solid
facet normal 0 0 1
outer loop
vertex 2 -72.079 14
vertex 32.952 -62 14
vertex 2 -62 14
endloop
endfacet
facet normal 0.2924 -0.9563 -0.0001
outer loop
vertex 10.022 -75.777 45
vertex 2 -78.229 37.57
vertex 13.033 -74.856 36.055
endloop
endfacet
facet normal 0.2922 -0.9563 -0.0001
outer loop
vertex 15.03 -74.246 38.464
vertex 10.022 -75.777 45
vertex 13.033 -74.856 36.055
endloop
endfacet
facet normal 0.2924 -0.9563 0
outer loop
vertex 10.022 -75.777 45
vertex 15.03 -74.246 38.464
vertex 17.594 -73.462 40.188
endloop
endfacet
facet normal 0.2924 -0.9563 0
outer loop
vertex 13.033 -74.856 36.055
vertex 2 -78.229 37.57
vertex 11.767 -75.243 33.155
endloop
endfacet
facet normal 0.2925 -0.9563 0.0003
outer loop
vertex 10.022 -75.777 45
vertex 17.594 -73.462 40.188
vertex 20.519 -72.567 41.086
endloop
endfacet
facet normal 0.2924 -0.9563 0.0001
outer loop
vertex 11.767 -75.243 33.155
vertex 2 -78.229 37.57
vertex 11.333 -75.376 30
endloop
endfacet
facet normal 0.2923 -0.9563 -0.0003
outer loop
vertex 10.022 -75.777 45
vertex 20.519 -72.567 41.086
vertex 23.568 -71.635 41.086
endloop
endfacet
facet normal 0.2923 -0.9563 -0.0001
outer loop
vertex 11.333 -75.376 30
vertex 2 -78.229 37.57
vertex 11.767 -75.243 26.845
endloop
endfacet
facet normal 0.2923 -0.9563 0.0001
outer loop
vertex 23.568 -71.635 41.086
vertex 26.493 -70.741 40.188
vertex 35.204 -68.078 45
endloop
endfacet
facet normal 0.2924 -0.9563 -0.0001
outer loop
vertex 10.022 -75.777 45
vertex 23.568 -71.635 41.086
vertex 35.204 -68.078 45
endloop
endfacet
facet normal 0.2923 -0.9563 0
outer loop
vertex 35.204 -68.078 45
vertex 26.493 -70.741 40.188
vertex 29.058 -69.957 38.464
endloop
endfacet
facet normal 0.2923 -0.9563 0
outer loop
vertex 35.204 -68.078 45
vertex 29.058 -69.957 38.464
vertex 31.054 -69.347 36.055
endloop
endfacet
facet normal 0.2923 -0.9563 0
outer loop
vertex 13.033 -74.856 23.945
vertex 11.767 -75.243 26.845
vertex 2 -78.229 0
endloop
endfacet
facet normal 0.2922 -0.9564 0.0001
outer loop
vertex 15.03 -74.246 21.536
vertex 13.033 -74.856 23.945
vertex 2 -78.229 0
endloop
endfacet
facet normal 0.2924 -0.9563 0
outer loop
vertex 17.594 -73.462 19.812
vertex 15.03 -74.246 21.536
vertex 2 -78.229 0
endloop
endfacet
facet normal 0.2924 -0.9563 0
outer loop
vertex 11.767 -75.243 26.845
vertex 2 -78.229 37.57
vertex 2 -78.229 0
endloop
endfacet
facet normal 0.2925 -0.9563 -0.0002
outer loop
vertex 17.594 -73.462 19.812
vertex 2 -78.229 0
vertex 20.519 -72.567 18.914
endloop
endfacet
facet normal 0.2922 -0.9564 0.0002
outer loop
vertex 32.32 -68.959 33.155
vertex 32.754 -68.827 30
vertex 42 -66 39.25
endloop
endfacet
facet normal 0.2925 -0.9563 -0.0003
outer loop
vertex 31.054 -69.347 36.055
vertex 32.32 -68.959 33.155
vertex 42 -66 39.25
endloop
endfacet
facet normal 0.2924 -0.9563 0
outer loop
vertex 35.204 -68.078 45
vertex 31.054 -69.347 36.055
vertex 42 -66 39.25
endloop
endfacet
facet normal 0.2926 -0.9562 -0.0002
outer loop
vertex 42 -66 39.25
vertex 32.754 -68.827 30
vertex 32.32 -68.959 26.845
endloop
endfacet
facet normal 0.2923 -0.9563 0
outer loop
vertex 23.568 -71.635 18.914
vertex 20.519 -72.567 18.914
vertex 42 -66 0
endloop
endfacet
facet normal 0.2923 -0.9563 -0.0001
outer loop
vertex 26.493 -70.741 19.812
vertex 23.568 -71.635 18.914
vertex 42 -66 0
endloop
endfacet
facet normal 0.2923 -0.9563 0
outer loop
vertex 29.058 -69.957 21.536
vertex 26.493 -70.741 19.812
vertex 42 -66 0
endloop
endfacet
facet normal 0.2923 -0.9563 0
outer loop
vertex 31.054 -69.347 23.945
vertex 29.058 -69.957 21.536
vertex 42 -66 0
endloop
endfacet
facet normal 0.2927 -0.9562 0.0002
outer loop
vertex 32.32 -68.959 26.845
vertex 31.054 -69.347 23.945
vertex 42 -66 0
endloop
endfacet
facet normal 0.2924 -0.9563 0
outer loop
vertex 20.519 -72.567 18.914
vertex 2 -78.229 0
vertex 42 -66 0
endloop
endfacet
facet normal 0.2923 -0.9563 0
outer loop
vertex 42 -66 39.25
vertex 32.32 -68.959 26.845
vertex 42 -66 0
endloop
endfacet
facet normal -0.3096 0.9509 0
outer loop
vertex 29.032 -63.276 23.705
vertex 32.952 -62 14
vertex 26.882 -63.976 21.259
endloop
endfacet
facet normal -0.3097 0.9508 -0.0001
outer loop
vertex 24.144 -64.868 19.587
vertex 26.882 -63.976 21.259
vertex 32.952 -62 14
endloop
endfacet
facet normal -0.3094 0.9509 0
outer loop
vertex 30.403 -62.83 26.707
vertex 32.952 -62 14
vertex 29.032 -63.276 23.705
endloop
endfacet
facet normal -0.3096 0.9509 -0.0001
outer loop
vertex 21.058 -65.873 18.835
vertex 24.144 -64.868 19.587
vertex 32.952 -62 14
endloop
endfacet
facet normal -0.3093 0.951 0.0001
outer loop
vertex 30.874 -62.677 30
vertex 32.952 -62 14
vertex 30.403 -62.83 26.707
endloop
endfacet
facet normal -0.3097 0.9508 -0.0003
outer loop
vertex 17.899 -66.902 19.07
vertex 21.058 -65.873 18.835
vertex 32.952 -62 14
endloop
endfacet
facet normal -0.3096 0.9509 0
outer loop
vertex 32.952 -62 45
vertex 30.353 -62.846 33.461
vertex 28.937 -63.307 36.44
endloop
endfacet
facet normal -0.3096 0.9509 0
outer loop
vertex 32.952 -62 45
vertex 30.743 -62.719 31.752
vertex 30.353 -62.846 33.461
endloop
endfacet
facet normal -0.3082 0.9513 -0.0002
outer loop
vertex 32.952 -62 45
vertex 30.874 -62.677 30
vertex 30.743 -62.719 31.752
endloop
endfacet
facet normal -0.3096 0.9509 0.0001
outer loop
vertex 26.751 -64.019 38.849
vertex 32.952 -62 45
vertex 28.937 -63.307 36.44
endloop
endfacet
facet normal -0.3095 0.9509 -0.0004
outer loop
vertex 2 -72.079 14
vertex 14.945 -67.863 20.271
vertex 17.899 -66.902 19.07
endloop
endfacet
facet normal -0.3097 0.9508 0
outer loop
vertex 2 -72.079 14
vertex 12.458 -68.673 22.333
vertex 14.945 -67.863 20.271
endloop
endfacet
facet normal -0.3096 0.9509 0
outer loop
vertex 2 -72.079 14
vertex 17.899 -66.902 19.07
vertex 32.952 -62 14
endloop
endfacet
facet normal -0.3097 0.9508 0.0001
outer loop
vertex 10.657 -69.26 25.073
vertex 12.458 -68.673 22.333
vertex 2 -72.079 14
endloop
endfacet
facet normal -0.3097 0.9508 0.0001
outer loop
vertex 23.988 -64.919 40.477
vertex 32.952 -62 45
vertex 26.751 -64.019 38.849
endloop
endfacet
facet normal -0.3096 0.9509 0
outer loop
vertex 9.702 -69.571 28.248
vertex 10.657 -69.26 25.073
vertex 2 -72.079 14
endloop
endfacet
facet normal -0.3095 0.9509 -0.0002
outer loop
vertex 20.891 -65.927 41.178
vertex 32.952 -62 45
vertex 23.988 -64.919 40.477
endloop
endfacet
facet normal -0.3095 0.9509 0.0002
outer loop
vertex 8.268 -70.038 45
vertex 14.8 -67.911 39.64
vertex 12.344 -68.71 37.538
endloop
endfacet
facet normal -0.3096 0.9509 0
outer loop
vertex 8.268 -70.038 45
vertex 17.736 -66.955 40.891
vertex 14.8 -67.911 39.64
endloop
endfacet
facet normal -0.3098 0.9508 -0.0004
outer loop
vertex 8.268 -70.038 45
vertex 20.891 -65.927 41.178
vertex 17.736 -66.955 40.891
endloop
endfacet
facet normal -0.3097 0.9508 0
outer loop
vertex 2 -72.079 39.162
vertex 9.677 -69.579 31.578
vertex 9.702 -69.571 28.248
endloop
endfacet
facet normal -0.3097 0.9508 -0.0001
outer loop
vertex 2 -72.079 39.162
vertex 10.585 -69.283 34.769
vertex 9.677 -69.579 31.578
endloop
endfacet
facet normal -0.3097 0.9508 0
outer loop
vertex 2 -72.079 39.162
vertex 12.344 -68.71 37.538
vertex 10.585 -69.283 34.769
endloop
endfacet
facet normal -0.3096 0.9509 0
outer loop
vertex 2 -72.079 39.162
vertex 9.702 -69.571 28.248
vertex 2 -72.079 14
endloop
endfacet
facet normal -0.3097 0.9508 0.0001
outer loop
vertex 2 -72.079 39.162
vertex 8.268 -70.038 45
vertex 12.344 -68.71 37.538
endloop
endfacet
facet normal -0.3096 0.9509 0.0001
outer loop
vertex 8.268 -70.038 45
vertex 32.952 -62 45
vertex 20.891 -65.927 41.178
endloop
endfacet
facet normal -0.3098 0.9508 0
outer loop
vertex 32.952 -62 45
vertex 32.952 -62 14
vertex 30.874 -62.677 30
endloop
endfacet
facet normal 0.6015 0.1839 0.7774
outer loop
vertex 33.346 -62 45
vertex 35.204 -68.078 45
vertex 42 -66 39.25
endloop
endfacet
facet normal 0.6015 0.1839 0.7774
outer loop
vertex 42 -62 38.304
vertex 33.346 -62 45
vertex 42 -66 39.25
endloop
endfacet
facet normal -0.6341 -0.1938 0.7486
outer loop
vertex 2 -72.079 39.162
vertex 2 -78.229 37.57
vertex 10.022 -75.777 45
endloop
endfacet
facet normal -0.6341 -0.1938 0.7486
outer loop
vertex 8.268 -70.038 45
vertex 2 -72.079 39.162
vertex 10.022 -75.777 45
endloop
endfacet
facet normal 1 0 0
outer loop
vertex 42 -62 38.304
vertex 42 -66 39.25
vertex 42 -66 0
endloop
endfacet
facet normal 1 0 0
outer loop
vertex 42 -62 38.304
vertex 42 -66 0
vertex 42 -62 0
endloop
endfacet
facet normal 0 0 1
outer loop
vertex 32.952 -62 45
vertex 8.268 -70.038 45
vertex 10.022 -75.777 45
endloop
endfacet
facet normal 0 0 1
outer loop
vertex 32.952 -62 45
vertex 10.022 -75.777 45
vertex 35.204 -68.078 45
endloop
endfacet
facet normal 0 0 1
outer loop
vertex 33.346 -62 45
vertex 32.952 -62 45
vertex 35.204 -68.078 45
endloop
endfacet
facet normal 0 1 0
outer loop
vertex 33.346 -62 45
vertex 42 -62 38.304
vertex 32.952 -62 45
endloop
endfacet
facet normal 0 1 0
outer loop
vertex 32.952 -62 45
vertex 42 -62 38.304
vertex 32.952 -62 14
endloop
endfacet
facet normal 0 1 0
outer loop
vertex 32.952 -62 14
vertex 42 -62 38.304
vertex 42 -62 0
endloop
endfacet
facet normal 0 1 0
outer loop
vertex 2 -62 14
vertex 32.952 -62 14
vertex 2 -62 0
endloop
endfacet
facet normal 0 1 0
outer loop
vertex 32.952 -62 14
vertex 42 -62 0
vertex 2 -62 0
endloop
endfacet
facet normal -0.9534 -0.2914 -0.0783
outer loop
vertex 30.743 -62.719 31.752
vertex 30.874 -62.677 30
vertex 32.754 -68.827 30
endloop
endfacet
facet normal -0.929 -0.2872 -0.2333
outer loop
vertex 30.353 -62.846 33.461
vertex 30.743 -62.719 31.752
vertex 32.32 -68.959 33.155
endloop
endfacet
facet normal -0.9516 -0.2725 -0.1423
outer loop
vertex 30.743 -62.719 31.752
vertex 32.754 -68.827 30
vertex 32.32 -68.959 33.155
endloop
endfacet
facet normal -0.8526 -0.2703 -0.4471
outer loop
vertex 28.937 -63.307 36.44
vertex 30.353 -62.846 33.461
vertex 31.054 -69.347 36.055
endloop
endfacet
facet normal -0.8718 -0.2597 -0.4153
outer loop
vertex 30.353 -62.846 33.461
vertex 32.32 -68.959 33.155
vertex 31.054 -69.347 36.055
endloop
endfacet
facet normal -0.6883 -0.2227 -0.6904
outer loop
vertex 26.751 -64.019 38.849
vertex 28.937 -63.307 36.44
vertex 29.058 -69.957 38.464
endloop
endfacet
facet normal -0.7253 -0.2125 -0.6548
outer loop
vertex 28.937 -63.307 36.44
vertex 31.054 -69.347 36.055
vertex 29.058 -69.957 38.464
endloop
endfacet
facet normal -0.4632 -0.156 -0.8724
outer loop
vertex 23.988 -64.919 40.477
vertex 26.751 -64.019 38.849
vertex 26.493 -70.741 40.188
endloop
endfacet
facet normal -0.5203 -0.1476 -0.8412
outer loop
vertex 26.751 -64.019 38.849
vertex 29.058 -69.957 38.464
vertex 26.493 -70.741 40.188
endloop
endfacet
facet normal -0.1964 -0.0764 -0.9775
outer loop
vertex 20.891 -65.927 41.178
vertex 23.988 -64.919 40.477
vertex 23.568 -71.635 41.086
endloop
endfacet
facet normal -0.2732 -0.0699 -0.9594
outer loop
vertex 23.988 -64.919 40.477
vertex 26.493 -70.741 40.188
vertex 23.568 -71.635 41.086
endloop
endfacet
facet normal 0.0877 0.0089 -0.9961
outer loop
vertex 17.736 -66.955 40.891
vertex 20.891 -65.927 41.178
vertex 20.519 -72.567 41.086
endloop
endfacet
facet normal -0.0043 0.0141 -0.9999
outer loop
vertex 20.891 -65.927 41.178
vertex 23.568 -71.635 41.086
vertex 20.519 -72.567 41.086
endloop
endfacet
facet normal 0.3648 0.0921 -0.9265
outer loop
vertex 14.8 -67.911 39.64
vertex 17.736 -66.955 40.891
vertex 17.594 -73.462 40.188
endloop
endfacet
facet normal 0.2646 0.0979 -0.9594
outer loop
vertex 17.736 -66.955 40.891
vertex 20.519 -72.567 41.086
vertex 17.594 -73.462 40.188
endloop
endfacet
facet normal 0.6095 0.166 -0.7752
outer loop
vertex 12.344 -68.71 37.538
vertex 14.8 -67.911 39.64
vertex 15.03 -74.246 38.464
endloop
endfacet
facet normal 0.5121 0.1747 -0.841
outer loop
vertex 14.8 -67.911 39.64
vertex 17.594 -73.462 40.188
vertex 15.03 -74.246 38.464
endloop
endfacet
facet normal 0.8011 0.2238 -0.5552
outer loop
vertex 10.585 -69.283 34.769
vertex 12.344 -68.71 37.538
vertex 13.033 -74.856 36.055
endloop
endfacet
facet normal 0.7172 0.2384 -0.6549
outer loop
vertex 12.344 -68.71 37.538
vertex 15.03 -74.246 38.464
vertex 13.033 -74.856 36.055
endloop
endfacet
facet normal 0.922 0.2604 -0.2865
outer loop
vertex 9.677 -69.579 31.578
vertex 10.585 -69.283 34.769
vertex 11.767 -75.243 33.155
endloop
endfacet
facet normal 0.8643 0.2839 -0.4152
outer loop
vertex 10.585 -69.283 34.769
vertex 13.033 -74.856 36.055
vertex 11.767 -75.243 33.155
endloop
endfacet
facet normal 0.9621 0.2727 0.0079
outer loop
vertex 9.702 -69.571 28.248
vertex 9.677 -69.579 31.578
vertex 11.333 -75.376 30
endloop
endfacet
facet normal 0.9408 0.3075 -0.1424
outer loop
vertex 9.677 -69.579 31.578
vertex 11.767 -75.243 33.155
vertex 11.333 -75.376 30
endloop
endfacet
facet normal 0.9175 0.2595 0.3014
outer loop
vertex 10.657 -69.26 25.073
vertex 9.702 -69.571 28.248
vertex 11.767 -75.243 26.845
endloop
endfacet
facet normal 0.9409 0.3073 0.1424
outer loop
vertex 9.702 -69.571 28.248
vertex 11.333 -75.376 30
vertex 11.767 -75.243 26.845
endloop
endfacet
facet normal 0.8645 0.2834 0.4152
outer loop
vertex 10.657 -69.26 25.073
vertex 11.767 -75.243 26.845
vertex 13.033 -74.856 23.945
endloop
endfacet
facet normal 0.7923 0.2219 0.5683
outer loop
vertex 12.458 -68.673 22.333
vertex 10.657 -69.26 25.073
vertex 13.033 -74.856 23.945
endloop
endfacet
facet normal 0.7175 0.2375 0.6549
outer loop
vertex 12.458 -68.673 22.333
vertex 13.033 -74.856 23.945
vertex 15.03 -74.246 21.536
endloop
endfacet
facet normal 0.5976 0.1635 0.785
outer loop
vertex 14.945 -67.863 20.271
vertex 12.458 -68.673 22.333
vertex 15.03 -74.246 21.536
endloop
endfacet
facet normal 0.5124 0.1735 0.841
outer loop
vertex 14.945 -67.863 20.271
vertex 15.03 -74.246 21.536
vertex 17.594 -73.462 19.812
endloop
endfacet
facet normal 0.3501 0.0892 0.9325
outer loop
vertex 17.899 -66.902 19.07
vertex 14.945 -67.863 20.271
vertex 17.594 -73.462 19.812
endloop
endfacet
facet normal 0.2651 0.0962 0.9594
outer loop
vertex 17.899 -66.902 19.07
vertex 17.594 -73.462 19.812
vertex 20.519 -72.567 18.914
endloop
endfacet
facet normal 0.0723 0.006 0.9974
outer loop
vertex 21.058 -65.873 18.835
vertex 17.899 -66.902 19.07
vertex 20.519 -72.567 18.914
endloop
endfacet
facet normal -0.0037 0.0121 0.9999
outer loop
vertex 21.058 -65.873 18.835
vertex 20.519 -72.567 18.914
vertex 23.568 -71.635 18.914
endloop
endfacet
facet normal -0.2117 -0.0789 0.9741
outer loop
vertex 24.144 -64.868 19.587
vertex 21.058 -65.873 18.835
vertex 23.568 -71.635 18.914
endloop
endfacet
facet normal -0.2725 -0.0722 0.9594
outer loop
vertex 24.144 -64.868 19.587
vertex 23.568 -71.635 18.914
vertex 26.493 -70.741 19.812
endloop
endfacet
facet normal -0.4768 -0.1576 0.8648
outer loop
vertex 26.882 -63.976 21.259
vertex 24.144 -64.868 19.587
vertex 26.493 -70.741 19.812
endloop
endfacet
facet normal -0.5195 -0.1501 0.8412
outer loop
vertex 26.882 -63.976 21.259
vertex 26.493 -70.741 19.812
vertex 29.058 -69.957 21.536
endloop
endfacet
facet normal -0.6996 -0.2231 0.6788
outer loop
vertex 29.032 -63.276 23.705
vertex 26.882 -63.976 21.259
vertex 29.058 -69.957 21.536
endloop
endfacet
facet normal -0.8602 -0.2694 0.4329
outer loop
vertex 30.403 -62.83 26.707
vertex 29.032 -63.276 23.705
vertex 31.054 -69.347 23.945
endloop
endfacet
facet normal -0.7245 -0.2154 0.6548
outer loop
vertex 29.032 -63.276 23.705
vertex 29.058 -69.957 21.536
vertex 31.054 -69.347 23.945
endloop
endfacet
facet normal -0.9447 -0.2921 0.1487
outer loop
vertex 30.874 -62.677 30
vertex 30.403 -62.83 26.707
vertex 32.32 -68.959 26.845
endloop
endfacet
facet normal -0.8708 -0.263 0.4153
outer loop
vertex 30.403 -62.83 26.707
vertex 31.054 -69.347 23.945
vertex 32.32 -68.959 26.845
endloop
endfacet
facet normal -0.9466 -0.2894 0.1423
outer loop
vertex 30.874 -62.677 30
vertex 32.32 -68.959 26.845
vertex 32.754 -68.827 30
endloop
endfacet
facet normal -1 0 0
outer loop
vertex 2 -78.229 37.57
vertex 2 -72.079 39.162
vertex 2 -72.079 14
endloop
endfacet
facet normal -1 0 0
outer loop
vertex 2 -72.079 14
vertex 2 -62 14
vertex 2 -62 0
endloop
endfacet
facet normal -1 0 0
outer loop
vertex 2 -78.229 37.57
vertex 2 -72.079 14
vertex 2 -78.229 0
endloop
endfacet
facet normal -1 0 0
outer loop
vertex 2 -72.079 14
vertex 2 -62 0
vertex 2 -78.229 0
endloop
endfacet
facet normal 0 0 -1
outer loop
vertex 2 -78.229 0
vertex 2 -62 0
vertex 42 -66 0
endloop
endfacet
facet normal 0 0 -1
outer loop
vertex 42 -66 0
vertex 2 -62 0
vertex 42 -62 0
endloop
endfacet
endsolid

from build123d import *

# Parameters (mm, degrees)
PAD005_DEPTH    = 45
SKETCH012_R     = 11.2
POCKET006_DEPTH = 15.5210872128
POCKET_DEPTH    = 15.5210872128
POCKET007_DEPTH = 31


with BuildPart() as part:
    # Sketch004 → Pad005 (new body)
    with BuildSketch(Plane.XY):
        Polygon((42, -62), (2, -62), (2, -78.2292272583), (42, -66), align=None)
    extrude(amount=PAD005_DEPTH)

    # Sketch012 → Pocket006 (cut, through all)
    with BuildSketch(Plane(origin=(22.0435767909, -72.1012908672, 0), x_dir=(0.956304756, 0.2923717047, 0), z_dir=(0.2923717047, -0.956304756, 0))):
        with Locations((0, 30)):
            Circle(SKETCH012_R)
    extrude(amount=-POCKET006_DEPTH, mode=Mode.SUBTRACT)

    # Sketch013 → Pocket (cut, through all)
    with BuildSketch(Plane(origin=(22.0435767909, -72.1012908672, 0), x_dir=(0.956304756, 0.2923717047, 0), z_dir=(0.2923717047, -0.956304756, 0))):
        Polygon((0, 56.1345), (33.1881878236, 29.2826289434), (33.1881878236, 69.8913260191), (-31.9570121764, 69.8913260191), (-31.9570121764, 27.8285260191), align=None)
    extrude(amount=-POCKET_DEPTH, mode=Mode.SUBTRACT)

    # Sketch014 → Pocket007 (cut)
    with BuildSketch(Plane.XY.offset(45)):
        Polygon((45.8903901048, -57.7868109147), (-5.585371219, -74.5487714011), (-10.263824653, -60.1813021227), (41.2119366707, -43.4193416363), align=None)
    extrude(amount=-POCKET007_DEPTH, mode=Mode.SUBTRACT)


solid = part.part
